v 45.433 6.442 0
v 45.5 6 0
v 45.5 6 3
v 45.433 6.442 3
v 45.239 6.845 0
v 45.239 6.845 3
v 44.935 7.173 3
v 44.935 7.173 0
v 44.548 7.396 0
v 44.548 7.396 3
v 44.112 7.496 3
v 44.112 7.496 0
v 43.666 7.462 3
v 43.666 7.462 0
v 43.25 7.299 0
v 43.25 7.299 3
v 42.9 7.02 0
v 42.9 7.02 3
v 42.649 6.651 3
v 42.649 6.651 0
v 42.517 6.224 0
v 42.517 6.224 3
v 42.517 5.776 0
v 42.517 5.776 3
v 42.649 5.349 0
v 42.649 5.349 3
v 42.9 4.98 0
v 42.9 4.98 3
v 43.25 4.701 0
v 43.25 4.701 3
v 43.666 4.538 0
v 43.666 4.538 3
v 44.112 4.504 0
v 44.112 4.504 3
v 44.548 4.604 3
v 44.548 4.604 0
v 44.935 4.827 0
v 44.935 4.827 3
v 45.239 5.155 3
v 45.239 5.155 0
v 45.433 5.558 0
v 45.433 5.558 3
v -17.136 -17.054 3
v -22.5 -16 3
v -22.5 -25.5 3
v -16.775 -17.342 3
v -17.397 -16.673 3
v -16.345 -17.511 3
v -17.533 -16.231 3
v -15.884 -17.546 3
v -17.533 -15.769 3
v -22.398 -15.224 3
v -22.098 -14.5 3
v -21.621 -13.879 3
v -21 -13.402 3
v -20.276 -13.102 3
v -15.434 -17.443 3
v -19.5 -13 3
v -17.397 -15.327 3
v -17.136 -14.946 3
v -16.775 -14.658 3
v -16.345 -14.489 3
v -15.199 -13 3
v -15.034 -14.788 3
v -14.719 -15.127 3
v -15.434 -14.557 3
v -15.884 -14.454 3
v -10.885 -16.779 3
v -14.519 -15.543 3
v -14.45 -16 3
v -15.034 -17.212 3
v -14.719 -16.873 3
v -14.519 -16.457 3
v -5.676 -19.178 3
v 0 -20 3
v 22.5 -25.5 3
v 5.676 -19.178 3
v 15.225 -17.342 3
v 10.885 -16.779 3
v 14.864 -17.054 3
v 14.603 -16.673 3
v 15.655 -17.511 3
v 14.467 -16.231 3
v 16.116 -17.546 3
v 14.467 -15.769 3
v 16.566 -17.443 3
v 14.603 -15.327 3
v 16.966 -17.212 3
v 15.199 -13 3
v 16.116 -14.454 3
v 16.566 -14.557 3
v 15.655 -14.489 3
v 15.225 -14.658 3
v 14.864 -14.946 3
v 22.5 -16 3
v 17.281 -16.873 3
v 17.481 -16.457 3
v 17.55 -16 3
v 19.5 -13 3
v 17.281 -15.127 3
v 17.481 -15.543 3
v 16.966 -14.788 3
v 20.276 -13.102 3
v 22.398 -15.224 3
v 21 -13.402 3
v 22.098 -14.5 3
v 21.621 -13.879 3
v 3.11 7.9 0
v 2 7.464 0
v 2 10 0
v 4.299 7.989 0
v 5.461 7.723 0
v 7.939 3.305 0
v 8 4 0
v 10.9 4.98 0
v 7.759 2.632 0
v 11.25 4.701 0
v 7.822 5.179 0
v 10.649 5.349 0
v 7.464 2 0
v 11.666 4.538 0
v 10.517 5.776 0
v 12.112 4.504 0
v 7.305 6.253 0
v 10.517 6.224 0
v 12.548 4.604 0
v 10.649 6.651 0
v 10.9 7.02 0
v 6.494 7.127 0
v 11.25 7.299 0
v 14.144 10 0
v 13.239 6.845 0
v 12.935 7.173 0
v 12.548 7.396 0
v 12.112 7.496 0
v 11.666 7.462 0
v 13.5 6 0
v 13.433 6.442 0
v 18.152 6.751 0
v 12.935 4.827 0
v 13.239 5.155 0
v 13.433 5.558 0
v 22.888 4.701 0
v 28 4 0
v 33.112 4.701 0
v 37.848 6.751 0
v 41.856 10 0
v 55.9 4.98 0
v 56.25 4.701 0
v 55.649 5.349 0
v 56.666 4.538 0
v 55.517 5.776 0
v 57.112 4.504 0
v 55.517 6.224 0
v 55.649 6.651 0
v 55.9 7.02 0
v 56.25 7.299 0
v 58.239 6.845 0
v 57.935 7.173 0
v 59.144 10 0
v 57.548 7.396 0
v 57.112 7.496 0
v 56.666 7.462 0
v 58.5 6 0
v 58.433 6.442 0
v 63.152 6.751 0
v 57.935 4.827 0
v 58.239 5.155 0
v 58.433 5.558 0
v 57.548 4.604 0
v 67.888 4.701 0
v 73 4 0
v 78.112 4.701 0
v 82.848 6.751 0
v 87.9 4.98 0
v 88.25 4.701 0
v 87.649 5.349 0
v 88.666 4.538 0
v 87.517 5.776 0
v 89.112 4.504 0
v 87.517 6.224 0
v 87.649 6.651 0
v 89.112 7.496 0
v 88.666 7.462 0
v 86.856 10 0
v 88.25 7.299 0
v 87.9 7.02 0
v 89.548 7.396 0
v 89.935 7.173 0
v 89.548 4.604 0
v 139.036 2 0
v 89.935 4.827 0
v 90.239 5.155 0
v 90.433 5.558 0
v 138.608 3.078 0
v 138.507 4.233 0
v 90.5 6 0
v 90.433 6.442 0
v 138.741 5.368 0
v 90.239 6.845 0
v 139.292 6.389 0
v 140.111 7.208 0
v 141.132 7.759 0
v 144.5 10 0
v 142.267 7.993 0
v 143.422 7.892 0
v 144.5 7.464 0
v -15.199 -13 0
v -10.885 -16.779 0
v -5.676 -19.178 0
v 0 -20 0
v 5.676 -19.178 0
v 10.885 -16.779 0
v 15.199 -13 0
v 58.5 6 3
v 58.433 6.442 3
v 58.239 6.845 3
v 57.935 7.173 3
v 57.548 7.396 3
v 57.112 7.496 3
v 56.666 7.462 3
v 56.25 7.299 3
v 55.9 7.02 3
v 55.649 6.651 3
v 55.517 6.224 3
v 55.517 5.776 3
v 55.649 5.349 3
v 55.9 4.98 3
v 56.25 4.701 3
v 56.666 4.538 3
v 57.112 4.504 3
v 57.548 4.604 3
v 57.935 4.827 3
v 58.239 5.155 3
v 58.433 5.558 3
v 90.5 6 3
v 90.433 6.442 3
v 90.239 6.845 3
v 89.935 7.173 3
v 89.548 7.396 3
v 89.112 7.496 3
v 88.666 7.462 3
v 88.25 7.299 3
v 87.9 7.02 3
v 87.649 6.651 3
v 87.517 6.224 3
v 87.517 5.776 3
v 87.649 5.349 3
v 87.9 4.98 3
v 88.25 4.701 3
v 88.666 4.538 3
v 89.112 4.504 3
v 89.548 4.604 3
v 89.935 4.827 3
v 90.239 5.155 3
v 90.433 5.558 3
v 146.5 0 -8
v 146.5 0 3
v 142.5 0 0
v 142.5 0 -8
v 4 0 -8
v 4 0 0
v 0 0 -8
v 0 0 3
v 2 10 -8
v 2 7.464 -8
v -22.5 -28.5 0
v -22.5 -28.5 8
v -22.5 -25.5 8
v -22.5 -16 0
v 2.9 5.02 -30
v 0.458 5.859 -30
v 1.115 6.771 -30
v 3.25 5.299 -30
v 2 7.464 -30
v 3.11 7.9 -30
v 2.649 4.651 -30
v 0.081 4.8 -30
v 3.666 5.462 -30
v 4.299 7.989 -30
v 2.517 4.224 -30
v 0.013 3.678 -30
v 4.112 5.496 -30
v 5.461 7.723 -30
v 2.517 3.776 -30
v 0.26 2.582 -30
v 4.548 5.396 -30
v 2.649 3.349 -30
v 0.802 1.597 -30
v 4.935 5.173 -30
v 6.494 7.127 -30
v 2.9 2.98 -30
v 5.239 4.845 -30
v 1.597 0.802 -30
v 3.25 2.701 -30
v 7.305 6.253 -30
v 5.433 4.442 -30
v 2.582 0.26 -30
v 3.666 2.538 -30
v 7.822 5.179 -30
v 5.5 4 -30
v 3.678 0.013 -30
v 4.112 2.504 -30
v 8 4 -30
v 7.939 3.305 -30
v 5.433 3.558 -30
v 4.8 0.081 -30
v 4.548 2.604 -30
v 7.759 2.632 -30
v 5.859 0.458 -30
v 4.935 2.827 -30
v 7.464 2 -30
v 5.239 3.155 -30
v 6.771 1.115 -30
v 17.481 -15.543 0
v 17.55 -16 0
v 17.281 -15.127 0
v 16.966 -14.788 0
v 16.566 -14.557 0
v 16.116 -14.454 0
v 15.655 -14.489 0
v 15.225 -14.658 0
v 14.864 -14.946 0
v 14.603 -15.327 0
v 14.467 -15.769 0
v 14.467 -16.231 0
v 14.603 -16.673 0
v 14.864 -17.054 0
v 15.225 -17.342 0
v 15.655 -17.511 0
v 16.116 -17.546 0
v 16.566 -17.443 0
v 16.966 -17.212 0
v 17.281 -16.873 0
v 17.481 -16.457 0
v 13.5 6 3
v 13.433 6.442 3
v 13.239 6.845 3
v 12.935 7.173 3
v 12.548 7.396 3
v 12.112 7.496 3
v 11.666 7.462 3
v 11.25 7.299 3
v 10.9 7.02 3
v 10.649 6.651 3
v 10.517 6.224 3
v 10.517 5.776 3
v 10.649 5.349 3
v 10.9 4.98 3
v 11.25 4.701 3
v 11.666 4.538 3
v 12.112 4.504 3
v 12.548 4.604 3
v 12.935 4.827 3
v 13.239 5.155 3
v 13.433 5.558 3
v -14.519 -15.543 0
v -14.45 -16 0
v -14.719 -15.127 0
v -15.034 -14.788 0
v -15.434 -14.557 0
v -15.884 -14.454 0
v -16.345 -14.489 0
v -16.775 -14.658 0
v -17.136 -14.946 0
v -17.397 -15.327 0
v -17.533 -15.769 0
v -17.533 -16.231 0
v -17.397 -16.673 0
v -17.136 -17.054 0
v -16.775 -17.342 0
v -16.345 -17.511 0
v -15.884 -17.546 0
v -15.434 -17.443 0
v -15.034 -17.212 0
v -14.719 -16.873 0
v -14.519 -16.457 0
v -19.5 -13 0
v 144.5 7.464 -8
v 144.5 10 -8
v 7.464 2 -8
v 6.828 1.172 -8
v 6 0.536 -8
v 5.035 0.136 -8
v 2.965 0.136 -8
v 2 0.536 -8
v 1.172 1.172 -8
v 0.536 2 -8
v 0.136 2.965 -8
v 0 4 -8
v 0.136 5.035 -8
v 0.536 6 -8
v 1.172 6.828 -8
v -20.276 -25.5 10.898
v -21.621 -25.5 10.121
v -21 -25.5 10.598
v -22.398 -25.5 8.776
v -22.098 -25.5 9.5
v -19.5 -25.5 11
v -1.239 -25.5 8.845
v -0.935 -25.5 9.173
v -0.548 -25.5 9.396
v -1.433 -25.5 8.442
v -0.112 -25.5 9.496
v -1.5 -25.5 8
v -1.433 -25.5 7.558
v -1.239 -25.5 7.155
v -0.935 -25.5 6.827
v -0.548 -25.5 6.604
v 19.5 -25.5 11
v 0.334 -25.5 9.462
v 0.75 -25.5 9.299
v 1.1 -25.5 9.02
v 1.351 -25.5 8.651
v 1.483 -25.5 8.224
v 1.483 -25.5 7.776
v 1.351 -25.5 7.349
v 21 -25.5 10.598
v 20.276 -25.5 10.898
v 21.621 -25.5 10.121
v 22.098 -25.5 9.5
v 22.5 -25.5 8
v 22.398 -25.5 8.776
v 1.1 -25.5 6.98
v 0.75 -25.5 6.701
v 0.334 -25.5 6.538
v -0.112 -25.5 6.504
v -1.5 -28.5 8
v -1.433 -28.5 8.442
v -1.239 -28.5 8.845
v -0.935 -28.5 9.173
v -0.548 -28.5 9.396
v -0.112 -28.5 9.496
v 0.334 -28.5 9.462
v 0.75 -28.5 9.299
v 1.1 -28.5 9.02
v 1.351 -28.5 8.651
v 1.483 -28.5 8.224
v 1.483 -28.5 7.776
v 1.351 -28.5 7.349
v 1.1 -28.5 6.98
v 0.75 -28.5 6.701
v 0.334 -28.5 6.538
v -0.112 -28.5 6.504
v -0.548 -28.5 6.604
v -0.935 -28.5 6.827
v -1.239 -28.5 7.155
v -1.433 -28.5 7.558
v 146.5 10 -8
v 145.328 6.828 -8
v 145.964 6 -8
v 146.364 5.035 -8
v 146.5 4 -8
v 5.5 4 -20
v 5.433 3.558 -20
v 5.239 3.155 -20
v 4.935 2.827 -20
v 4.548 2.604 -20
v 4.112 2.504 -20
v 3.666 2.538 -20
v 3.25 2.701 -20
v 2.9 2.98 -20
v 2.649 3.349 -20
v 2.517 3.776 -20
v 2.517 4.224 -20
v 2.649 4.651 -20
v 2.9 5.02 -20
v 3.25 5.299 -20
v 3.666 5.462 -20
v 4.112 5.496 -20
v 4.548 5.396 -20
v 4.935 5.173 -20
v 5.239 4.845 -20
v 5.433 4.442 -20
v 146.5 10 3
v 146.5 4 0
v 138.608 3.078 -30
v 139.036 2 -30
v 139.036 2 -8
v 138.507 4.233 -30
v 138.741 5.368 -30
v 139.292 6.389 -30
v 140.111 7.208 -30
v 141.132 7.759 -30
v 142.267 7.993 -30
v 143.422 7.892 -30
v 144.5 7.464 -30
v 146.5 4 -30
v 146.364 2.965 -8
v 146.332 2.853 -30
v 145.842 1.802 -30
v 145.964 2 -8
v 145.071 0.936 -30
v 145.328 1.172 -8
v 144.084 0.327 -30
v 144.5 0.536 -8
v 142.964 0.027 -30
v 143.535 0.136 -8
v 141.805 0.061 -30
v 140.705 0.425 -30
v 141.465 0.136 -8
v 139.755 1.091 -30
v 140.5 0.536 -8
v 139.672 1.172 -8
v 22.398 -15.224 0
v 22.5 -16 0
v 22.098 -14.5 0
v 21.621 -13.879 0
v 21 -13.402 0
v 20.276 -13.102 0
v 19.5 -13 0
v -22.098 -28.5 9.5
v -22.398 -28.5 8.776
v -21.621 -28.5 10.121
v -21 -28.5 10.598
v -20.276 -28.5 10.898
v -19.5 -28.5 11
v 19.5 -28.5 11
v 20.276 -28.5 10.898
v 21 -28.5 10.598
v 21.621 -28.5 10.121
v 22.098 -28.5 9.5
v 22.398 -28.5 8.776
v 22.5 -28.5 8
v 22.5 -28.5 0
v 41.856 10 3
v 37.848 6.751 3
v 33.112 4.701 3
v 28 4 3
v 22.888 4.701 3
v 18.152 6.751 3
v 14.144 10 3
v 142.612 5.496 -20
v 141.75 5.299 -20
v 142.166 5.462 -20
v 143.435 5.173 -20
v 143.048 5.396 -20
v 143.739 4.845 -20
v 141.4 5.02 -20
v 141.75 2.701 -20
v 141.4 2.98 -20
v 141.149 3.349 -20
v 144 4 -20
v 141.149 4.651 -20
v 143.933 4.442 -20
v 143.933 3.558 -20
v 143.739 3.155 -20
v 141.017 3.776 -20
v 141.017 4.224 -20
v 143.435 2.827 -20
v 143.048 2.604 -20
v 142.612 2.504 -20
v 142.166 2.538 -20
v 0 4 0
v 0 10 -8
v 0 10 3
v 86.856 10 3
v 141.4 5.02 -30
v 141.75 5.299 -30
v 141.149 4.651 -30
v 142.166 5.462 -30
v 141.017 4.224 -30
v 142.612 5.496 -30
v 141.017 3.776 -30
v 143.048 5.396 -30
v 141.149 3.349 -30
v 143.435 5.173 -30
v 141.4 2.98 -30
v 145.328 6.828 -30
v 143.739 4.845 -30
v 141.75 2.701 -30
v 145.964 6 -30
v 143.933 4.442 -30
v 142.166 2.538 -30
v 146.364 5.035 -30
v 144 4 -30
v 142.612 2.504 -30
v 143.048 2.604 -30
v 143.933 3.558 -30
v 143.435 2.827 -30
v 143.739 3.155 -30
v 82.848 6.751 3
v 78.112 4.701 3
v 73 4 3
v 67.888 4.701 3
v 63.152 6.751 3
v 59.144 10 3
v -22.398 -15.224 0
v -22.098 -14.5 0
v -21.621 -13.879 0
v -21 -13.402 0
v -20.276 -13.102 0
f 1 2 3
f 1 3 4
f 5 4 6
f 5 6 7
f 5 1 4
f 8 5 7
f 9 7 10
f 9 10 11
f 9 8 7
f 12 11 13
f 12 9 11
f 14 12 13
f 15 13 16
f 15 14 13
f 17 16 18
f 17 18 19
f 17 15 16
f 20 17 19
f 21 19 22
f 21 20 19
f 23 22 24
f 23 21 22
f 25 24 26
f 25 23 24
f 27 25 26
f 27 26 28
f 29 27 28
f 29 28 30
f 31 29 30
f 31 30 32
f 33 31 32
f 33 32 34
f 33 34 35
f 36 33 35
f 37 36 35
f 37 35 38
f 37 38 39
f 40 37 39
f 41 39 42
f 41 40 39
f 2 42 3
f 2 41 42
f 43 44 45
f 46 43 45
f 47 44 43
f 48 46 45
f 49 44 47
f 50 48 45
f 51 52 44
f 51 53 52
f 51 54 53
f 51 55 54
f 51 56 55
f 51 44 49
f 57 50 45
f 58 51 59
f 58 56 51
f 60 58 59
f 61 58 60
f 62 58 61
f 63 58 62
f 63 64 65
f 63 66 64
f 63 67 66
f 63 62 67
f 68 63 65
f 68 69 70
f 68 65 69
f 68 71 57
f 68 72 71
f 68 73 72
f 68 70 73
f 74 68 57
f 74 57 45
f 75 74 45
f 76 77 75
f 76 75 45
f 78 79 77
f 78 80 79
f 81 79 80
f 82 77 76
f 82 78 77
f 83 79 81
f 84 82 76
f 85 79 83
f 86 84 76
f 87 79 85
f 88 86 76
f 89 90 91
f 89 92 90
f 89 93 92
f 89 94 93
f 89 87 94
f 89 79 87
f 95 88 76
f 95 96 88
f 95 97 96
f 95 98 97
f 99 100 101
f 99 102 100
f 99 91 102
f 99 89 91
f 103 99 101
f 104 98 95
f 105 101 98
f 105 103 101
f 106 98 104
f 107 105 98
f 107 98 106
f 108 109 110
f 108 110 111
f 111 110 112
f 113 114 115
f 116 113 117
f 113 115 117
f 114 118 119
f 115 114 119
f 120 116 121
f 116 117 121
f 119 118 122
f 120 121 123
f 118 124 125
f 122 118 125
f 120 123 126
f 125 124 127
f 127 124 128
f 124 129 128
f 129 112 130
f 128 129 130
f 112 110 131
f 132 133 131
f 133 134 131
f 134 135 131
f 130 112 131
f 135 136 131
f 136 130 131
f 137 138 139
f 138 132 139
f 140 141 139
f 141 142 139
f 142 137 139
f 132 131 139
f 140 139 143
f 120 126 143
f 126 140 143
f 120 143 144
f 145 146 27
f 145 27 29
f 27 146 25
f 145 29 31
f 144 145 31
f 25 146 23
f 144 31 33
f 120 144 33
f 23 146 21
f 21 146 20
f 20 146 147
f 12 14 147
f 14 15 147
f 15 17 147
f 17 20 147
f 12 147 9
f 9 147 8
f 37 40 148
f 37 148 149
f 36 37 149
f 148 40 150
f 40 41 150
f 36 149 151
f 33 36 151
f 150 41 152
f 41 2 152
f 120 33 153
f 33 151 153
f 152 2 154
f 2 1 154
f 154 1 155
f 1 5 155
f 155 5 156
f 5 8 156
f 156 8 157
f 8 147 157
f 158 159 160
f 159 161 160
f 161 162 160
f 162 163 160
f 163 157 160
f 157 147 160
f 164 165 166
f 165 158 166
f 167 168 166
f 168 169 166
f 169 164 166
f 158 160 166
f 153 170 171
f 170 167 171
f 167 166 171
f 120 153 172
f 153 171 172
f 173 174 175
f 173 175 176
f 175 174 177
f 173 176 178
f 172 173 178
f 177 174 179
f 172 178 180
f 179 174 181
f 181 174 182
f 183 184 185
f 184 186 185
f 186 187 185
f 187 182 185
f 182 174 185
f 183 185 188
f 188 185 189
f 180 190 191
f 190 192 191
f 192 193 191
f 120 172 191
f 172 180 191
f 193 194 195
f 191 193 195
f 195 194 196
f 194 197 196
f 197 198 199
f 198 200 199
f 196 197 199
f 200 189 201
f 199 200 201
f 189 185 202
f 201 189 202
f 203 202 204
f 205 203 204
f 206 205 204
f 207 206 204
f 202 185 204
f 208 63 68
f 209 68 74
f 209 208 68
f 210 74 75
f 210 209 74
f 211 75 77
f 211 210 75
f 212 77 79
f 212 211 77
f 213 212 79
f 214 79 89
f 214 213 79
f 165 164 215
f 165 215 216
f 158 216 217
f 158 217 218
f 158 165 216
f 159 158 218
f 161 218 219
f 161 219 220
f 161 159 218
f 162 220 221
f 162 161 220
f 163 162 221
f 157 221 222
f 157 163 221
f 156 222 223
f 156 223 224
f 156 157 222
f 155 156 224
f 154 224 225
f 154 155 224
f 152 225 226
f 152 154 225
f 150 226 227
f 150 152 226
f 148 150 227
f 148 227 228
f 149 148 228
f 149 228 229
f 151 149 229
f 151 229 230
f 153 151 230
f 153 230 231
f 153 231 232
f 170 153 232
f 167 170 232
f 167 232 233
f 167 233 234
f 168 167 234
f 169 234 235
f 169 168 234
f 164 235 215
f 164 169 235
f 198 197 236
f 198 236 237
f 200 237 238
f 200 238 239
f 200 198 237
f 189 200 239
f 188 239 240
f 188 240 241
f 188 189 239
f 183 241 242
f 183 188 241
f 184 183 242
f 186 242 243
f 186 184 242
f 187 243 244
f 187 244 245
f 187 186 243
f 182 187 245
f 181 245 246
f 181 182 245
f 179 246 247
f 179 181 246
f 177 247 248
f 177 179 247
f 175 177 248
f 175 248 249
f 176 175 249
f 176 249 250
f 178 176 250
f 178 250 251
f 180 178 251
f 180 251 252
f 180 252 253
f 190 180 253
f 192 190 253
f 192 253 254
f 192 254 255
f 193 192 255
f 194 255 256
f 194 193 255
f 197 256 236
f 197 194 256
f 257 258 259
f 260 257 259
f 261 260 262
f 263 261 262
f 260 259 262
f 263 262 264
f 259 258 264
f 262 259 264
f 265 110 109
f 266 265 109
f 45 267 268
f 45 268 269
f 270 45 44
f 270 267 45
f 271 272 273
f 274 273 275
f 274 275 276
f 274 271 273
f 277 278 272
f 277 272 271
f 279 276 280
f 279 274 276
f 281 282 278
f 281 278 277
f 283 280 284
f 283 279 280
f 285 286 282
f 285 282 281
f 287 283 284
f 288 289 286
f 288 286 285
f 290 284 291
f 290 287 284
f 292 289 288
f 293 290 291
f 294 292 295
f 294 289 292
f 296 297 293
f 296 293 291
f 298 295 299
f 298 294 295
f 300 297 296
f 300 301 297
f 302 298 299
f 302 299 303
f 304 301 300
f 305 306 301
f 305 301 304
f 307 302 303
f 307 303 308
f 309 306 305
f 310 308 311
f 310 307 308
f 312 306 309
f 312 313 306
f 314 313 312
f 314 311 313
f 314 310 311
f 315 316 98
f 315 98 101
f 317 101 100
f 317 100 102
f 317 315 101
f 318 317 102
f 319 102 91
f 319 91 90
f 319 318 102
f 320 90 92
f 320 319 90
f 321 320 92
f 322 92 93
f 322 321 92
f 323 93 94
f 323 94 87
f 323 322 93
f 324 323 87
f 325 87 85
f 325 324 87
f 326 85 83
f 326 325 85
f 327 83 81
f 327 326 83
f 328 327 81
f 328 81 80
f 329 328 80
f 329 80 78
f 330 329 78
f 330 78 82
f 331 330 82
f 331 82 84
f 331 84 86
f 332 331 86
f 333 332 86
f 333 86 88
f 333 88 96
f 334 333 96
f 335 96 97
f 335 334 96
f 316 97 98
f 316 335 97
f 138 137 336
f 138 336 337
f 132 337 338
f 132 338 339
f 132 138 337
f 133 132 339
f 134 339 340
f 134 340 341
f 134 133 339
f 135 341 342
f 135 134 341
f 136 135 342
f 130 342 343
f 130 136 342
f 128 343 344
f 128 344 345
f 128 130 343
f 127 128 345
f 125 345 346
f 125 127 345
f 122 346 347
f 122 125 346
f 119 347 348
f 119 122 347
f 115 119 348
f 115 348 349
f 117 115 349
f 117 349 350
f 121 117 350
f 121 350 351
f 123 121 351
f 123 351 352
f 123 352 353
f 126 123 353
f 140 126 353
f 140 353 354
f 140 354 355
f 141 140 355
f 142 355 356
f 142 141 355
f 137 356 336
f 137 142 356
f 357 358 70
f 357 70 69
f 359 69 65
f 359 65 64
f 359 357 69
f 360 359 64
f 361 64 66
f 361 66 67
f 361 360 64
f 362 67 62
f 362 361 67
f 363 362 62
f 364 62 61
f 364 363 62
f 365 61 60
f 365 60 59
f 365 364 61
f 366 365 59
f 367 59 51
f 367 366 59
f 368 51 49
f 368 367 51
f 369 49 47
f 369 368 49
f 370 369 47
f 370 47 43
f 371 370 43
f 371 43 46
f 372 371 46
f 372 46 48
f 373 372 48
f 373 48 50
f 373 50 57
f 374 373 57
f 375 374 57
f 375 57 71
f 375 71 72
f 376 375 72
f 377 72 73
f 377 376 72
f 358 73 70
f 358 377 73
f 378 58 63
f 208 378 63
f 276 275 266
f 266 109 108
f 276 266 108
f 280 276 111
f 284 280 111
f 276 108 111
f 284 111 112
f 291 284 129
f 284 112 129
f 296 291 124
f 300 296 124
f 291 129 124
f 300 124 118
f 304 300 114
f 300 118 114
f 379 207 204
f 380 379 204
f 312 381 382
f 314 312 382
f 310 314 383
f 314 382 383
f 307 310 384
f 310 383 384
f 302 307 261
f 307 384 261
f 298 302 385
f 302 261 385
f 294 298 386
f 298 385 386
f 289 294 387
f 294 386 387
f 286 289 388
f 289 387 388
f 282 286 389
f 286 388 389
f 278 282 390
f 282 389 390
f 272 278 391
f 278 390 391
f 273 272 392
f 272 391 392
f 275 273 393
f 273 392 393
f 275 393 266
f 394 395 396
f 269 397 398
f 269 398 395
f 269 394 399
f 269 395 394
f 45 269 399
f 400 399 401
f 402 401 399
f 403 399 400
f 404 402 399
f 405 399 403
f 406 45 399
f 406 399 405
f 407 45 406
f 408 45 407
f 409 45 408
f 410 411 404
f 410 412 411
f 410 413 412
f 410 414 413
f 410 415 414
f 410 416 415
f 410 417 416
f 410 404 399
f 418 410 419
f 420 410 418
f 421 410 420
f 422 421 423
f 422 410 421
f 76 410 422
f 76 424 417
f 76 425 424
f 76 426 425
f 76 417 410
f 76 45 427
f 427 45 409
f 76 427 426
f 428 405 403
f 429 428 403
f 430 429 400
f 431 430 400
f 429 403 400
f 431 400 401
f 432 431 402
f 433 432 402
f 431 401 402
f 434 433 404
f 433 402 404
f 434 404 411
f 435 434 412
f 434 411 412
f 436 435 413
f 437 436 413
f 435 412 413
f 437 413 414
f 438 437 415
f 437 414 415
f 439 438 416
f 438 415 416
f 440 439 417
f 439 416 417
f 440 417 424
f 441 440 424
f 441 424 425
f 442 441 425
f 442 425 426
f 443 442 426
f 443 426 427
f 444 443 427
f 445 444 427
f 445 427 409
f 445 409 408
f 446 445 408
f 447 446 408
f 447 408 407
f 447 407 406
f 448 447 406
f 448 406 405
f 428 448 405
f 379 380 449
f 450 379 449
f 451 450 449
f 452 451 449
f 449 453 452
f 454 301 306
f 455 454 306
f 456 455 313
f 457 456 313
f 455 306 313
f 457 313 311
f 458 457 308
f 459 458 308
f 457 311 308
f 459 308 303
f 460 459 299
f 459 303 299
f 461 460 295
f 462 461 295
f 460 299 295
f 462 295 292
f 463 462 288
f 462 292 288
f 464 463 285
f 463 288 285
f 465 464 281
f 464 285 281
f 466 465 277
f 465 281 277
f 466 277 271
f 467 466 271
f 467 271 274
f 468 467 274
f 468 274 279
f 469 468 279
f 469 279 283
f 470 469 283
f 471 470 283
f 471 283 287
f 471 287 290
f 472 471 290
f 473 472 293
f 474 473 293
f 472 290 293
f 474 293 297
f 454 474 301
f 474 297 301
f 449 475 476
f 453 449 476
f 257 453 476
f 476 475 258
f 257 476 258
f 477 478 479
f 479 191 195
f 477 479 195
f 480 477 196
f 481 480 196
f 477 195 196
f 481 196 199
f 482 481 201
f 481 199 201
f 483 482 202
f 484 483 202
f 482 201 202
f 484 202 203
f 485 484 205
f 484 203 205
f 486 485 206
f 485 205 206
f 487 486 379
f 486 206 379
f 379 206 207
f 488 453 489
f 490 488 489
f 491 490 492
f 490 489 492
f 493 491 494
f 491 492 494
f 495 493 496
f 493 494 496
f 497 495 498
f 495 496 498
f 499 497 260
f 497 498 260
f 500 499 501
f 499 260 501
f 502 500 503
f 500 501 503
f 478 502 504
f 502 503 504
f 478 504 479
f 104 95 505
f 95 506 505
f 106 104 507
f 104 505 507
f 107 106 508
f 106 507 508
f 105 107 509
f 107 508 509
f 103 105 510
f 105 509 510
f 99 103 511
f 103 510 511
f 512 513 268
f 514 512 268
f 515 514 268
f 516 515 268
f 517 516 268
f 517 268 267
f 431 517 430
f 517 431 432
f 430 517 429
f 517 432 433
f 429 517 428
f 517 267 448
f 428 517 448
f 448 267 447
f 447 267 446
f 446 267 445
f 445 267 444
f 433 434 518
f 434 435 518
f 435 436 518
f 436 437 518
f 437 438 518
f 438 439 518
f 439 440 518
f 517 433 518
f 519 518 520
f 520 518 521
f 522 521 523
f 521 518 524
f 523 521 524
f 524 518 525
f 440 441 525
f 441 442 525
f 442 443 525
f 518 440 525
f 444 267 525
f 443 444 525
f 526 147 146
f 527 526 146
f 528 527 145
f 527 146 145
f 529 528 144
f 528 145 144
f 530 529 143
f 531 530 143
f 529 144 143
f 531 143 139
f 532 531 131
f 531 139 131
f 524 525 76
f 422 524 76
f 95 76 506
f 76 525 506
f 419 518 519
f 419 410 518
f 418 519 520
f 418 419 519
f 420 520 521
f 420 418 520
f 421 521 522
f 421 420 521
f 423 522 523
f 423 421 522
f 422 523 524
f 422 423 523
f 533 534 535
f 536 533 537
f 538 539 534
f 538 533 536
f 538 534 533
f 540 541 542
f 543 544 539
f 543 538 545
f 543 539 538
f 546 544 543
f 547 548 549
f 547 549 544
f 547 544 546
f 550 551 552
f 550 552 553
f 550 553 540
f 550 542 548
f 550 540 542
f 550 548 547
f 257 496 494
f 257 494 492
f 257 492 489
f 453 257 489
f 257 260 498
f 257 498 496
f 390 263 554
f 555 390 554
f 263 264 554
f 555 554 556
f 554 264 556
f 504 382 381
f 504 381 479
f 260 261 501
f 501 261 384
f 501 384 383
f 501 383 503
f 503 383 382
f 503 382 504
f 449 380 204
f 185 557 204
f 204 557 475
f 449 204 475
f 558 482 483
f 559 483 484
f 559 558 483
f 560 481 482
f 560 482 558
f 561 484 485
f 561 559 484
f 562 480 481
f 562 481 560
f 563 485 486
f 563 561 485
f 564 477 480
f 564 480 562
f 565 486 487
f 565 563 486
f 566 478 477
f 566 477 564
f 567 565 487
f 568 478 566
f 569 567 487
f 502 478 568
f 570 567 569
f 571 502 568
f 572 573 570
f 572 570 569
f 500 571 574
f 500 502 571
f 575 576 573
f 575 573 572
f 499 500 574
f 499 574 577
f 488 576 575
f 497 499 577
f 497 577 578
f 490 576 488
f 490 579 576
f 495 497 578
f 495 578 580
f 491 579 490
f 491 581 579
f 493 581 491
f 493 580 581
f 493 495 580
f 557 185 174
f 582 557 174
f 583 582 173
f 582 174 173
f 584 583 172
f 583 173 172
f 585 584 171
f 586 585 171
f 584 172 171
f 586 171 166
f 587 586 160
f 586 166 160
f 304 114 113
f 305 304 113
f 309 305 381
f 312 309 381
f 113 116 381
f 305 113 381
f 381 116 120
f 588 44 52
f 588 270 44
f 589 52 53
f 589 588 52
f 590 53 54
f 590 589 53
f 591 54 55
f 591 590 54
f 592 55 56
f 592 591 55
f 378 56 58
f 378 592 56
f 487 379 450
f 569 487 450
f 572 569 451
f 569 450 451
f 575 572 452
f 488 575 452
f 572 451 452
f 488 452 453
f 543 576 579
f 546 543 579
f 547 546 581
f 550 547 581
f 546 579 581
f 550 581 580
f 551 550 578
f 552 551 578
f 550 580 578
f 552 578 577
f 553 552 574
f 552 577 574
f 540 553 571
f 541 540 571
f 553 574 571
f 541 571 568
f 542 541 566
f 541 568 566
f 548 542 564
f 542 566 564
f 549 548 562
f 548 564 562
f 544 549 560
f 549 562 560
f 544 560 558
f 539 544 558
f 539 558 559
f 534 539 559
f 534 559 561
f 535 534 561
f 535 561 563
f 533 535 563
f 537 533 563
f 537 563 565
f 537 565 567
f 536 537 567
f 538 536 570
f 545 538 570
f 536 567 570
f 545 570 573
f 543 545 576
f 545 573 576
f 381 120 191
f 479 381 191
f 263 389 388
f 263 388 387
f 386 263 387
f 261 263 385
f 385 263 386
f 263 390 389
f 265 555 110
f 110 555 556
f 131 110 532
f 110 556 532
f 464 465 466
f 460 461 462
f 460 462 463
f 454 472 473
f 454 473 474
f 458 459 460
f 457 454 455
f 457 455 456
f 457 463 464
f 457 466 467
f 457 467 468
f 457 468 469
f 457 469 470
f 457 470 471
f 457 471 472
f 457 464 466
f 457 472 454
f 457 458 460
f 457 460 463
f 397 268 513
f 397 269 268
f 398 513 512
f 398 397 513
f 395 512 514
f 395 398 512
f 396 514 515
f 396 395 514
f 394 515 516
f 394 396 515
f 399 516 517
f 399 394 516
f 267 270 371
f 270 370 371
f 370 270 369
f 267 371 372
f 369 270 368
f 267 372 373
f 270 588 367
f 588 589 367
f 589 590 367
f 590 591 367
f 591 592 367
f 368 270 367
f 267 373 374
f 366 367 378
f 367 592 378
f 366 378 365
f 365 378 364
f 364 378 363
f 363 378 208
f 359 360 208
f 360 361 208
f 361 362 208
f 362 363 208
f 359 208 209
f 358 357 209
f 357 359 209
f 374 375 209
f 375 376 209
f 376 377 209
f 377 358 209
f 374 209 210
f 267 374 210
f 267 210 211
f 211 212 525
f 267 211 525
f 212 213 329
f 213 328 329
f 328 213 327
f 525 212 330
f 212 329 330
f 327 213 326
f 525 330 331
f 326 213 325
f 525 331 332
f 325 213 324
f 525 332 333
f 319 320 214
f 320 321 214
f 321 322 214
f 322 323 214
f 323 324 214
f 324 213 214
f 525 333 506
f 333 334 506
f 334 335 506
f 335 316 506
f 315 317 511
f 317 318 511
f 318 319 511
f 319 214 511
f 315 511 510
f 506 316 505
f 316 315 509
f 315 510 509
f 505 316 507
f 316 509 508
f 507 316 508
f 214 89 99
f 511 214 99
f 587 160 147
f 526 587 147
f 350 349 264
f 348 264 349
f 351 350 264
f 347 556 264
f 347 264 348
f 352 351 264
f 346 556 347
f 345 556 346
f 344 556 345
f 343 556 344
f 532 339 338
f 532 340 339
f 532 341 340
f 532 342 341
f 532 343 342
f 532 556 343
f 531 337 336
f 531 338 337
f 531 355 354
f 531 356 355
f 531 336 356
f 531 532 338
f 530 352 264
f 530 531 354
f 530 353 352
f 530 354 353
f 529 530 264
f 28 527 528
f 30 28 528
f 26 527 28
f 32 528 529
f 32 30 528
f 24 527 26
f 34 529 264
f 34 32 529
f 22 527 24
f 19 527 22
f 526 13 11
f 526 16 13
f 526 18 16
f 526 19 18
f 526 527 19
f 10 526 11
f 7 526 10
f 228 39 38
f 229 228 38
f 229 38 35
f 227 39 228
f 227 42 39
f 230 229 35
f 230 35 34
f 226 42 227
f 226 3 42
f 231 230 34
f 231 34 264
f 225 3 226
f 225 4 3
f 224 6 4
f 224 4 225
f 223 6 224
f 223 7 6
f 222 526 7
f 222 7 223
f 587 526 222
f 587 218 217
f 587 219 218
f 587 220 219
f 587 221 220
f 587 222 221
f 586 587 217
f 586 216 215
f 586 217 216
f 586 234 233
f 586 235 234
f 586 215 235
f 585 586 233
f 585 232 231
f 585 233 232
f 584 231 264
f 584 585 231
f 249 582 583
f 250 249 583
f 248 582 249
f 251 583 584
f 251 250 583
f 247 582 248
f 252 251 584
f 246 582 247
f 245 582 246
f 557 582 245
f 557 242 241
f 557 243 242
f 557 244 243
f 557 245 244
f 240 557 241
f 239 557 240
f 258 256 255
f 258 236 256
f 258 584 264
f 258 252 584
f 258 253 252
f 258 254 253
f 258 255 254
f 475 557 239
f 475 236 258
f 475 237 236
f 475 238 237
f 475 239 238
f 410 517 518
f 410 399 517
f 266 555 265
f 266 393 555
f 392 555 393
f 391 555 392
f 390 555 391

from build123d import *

# Parameters (mm, degrees)
F0_R      = 1.5
F1_DEPTH  = 3
F3_DEPTH  = 8
F5_DEPTH  = 30
F6_R      = 1.5
F7_DEPTH  = 10
F8_W      = 45
F8_H      = 45
F8_R      = 1.55
F8_R_2    = 20
F9_DEPTH  = 3
F10_W     = 45
F10_H     = 6
F11_DEPTH = 3
F12_W     = 45
F12_H     = 3
F13_DEPTH = 8
F14_R     = 1.5
F15_DEPTH = 3.001
F16_R     = 1.55
F17_DEPTH = 33.001
F18_R     = 3


with BuildPart() as f1:
    # F0 (on Top) → F1 (new body)
    with BuildSketch(Plane.XY):
        with BuildLine():
            Line((0, 10), (0, 0))
            Line((0, 0), (146.5, 0))
            Line((146.5, 0), (146.5, 10))
            Line((146.5, 10), (86.8564064606, 10))
            ThreePointArc((86.8564064606, 10), (73, 4), (59.1435935394, 10))
            Line((59.1435935394, 10), (41.8564064606, 10))
            ThreePointArc((41.8564064606, 10), (28, 4), (14.1435935394, 10))
            Line((14.1435935394, 10), (0, 10))
        make_face()
        with Locations((12, 6)):
            Circle(F0_R, mode=Mode.SUBTRACT)
        with Locations((44, 6)):
            Circle(F0_R, mode=Mode.SUBTRACT)
        with Locations((57, 6)):
            Circle(F0_R, mode=Mode.SUBTRACT)
        with Locations((89, 6)):
            Circle(F0_R, mode=Mode.SUBTRACT)
    extrude(amount=F1_DEPTH)

    # F2 (on face) → F3 (join)
    with BuildSketch(Plane(origin=(0, 0, 0), x_dir=(1, 0, 0), z_dir=(0, 0, -1))):
        Polygon((146.5, 0), (0, 0), (0, -10), (2, -10), (2, -2), (144.5, -2), (144.5, -10), (146.5, -10), align=None)
    extrude(amount=F3_DEPTH)

    # F4 (on face) → F5 (join)
    with BuildSketch(Plane(origin=(0, 0, 0), x_dir=(1, 0, 0), z_dir=(0, 0, -1))):
        with BuildLine():
            ThreePointArc((8, -4), (7.8637033052, -2.9647238196), (7.4641016151, -2))
            Line((7.4641016151, -2), (2, -2))
            Line((2, -2), (2, -7.4641016151))
            ThreePointArc((2, -7.4641016151), (6, -7.4641016151), (8, -4))
        make_face()
        with BuildLine():
            Line((144.5, -2), (139.0358983849, -2))
            ThreePointArc((139.0358983849, -2), (139.6715728753, -6.8284271247), (144.5, -7.4641016151))
            Line((144.5, -7.4641016151), (144.5, -2))
        make_face()
        with BuildLine():
            Line((2, -2), (7.4641016151, -2))
            ThreePointArc((7.4641016151, -2), (1.1715728753, -1.1715728753), (2, -7.4641016151))
            Line((2, -7.4641016151), (2, -2))
        make_face()
        with BuildLine():
            ThreePointArc((144.5, -7.4641016151), (145.9641016151, -6), (146.5, -4))
            ThreePointArc((146.5, -4), (143.5352761804, -0.1362966948), (139.0358983849, -2))
            Line((139.0358983849, -2), (144.5, -2))
            Line((144.5, -2), (144.5, -7.4641016151))
        make_face()
    extrude(amount=F5_DEPTH)

    # F6 (on face) → F7 (cut)
    with BuildSketch(Plane(origin=(0, 0, -30), x_dir=(1, 0, 0), z_dir=(0, 0, -1))):
        with Locations((142.5, -4)):
            Circle(F6_R)
        with Locations((4, -4)):
            Circle(F6_R)
    extrude(amount=-F7_DEPTH, mode=Mode.SUBTRACT)


with BuildPart() as f9:
    # F8 (on Top) → F9 (new body)
    with BuildSketch(Plane.XY):
        Rectangle(F8_W, F8_H)
        with Locations((-16, -16)):
            Circle(F8_R, mode=Mode.SUBTRACT)
        with Locations((16, -16)):
            Circle(F8_R, mode=Mode.SUBTRACT)
        with Locations((-16, 16)):
            Circle(F8_R, mode=Mode.SUBTRACT)
        Circle(F8_R_2, mode=Mode.SUBTRACT)
        with Locations((16, 16)):
            Circle(F8_R, mode=Mode.SUBTRACT)
    extrude(amount=F9_DEPTH)

    # F10 (on Top) → F11 (join, through all)
    with BuildSketch(Plane.XY):
        with Locations((0, -25.5)):
            Rectangle(F10_W, F10_H)
    extrude(amount=F11_DEPTH)

    # F12 (on face) → F13 (join)
    with BuildSketch(Plane.XY.offset(3)):
        with Locations((0, -27)):
            Rectangle(F12_W, F12_H)
    extrude(amount=F13_DEPTH)

    # F14 (on face) → F15 (cut, through all)
    with BuildSketch(Plane(origin=(0, -25.5, 0), x_dir=(-1, 0, 0), z_dir=(0, 1, 0))):
        with Locations((0, 8)):
            Circle(F14_R)
    extrude(amount=-F15_DEPTH, mode=Mode.SUBTRACT)

    # F16 (on face) → F17 (cut, through all)
    with BuildSketch(Plane.XY.offset(3)):
        with BuildLine():
            Line((-22.5, 22.5), (-22.5, -13))
            Line((-22.5, -13), (-15.1986841536, -13))
            ThreePointArc((-15.1986841536, -13), (-6.9291527956, 18.7613123618), (20, 0))
            ThreePointArc((20, 0), (18.7613123618, -6.9291527956), (15.1986841536, -13))
            Line((15.1986841536, -13), (22.5, -13))
            Line((22.5, -13), (22.5, 22.5))
            Line((22.5, 22.5), (-22.5, 22.5))
        make_face()
        with Locations((-16, 16)):
            Circle(F16_R, mode=Mode.SUBTRACT)
        with Locations((16, 16)):
            Circle(F16_R, mode=Mode.SUBTRACT)
    extrude(amount=-F17_DEPTH, mode=Mode.SUBTRACT)

    # F18
    f18_edges = [f9.edges().sort_by_distance(p)[0] for p in [
        (22.5, -13, 1.5),
        (-22.5, -13, 1.5),
        (22.5, -27, 11),
        (-22.5, -27, 11),
    ]]
    fillet(f18_edges, radius=F18_R)


solid = Compound([f1.part, f9.part])
